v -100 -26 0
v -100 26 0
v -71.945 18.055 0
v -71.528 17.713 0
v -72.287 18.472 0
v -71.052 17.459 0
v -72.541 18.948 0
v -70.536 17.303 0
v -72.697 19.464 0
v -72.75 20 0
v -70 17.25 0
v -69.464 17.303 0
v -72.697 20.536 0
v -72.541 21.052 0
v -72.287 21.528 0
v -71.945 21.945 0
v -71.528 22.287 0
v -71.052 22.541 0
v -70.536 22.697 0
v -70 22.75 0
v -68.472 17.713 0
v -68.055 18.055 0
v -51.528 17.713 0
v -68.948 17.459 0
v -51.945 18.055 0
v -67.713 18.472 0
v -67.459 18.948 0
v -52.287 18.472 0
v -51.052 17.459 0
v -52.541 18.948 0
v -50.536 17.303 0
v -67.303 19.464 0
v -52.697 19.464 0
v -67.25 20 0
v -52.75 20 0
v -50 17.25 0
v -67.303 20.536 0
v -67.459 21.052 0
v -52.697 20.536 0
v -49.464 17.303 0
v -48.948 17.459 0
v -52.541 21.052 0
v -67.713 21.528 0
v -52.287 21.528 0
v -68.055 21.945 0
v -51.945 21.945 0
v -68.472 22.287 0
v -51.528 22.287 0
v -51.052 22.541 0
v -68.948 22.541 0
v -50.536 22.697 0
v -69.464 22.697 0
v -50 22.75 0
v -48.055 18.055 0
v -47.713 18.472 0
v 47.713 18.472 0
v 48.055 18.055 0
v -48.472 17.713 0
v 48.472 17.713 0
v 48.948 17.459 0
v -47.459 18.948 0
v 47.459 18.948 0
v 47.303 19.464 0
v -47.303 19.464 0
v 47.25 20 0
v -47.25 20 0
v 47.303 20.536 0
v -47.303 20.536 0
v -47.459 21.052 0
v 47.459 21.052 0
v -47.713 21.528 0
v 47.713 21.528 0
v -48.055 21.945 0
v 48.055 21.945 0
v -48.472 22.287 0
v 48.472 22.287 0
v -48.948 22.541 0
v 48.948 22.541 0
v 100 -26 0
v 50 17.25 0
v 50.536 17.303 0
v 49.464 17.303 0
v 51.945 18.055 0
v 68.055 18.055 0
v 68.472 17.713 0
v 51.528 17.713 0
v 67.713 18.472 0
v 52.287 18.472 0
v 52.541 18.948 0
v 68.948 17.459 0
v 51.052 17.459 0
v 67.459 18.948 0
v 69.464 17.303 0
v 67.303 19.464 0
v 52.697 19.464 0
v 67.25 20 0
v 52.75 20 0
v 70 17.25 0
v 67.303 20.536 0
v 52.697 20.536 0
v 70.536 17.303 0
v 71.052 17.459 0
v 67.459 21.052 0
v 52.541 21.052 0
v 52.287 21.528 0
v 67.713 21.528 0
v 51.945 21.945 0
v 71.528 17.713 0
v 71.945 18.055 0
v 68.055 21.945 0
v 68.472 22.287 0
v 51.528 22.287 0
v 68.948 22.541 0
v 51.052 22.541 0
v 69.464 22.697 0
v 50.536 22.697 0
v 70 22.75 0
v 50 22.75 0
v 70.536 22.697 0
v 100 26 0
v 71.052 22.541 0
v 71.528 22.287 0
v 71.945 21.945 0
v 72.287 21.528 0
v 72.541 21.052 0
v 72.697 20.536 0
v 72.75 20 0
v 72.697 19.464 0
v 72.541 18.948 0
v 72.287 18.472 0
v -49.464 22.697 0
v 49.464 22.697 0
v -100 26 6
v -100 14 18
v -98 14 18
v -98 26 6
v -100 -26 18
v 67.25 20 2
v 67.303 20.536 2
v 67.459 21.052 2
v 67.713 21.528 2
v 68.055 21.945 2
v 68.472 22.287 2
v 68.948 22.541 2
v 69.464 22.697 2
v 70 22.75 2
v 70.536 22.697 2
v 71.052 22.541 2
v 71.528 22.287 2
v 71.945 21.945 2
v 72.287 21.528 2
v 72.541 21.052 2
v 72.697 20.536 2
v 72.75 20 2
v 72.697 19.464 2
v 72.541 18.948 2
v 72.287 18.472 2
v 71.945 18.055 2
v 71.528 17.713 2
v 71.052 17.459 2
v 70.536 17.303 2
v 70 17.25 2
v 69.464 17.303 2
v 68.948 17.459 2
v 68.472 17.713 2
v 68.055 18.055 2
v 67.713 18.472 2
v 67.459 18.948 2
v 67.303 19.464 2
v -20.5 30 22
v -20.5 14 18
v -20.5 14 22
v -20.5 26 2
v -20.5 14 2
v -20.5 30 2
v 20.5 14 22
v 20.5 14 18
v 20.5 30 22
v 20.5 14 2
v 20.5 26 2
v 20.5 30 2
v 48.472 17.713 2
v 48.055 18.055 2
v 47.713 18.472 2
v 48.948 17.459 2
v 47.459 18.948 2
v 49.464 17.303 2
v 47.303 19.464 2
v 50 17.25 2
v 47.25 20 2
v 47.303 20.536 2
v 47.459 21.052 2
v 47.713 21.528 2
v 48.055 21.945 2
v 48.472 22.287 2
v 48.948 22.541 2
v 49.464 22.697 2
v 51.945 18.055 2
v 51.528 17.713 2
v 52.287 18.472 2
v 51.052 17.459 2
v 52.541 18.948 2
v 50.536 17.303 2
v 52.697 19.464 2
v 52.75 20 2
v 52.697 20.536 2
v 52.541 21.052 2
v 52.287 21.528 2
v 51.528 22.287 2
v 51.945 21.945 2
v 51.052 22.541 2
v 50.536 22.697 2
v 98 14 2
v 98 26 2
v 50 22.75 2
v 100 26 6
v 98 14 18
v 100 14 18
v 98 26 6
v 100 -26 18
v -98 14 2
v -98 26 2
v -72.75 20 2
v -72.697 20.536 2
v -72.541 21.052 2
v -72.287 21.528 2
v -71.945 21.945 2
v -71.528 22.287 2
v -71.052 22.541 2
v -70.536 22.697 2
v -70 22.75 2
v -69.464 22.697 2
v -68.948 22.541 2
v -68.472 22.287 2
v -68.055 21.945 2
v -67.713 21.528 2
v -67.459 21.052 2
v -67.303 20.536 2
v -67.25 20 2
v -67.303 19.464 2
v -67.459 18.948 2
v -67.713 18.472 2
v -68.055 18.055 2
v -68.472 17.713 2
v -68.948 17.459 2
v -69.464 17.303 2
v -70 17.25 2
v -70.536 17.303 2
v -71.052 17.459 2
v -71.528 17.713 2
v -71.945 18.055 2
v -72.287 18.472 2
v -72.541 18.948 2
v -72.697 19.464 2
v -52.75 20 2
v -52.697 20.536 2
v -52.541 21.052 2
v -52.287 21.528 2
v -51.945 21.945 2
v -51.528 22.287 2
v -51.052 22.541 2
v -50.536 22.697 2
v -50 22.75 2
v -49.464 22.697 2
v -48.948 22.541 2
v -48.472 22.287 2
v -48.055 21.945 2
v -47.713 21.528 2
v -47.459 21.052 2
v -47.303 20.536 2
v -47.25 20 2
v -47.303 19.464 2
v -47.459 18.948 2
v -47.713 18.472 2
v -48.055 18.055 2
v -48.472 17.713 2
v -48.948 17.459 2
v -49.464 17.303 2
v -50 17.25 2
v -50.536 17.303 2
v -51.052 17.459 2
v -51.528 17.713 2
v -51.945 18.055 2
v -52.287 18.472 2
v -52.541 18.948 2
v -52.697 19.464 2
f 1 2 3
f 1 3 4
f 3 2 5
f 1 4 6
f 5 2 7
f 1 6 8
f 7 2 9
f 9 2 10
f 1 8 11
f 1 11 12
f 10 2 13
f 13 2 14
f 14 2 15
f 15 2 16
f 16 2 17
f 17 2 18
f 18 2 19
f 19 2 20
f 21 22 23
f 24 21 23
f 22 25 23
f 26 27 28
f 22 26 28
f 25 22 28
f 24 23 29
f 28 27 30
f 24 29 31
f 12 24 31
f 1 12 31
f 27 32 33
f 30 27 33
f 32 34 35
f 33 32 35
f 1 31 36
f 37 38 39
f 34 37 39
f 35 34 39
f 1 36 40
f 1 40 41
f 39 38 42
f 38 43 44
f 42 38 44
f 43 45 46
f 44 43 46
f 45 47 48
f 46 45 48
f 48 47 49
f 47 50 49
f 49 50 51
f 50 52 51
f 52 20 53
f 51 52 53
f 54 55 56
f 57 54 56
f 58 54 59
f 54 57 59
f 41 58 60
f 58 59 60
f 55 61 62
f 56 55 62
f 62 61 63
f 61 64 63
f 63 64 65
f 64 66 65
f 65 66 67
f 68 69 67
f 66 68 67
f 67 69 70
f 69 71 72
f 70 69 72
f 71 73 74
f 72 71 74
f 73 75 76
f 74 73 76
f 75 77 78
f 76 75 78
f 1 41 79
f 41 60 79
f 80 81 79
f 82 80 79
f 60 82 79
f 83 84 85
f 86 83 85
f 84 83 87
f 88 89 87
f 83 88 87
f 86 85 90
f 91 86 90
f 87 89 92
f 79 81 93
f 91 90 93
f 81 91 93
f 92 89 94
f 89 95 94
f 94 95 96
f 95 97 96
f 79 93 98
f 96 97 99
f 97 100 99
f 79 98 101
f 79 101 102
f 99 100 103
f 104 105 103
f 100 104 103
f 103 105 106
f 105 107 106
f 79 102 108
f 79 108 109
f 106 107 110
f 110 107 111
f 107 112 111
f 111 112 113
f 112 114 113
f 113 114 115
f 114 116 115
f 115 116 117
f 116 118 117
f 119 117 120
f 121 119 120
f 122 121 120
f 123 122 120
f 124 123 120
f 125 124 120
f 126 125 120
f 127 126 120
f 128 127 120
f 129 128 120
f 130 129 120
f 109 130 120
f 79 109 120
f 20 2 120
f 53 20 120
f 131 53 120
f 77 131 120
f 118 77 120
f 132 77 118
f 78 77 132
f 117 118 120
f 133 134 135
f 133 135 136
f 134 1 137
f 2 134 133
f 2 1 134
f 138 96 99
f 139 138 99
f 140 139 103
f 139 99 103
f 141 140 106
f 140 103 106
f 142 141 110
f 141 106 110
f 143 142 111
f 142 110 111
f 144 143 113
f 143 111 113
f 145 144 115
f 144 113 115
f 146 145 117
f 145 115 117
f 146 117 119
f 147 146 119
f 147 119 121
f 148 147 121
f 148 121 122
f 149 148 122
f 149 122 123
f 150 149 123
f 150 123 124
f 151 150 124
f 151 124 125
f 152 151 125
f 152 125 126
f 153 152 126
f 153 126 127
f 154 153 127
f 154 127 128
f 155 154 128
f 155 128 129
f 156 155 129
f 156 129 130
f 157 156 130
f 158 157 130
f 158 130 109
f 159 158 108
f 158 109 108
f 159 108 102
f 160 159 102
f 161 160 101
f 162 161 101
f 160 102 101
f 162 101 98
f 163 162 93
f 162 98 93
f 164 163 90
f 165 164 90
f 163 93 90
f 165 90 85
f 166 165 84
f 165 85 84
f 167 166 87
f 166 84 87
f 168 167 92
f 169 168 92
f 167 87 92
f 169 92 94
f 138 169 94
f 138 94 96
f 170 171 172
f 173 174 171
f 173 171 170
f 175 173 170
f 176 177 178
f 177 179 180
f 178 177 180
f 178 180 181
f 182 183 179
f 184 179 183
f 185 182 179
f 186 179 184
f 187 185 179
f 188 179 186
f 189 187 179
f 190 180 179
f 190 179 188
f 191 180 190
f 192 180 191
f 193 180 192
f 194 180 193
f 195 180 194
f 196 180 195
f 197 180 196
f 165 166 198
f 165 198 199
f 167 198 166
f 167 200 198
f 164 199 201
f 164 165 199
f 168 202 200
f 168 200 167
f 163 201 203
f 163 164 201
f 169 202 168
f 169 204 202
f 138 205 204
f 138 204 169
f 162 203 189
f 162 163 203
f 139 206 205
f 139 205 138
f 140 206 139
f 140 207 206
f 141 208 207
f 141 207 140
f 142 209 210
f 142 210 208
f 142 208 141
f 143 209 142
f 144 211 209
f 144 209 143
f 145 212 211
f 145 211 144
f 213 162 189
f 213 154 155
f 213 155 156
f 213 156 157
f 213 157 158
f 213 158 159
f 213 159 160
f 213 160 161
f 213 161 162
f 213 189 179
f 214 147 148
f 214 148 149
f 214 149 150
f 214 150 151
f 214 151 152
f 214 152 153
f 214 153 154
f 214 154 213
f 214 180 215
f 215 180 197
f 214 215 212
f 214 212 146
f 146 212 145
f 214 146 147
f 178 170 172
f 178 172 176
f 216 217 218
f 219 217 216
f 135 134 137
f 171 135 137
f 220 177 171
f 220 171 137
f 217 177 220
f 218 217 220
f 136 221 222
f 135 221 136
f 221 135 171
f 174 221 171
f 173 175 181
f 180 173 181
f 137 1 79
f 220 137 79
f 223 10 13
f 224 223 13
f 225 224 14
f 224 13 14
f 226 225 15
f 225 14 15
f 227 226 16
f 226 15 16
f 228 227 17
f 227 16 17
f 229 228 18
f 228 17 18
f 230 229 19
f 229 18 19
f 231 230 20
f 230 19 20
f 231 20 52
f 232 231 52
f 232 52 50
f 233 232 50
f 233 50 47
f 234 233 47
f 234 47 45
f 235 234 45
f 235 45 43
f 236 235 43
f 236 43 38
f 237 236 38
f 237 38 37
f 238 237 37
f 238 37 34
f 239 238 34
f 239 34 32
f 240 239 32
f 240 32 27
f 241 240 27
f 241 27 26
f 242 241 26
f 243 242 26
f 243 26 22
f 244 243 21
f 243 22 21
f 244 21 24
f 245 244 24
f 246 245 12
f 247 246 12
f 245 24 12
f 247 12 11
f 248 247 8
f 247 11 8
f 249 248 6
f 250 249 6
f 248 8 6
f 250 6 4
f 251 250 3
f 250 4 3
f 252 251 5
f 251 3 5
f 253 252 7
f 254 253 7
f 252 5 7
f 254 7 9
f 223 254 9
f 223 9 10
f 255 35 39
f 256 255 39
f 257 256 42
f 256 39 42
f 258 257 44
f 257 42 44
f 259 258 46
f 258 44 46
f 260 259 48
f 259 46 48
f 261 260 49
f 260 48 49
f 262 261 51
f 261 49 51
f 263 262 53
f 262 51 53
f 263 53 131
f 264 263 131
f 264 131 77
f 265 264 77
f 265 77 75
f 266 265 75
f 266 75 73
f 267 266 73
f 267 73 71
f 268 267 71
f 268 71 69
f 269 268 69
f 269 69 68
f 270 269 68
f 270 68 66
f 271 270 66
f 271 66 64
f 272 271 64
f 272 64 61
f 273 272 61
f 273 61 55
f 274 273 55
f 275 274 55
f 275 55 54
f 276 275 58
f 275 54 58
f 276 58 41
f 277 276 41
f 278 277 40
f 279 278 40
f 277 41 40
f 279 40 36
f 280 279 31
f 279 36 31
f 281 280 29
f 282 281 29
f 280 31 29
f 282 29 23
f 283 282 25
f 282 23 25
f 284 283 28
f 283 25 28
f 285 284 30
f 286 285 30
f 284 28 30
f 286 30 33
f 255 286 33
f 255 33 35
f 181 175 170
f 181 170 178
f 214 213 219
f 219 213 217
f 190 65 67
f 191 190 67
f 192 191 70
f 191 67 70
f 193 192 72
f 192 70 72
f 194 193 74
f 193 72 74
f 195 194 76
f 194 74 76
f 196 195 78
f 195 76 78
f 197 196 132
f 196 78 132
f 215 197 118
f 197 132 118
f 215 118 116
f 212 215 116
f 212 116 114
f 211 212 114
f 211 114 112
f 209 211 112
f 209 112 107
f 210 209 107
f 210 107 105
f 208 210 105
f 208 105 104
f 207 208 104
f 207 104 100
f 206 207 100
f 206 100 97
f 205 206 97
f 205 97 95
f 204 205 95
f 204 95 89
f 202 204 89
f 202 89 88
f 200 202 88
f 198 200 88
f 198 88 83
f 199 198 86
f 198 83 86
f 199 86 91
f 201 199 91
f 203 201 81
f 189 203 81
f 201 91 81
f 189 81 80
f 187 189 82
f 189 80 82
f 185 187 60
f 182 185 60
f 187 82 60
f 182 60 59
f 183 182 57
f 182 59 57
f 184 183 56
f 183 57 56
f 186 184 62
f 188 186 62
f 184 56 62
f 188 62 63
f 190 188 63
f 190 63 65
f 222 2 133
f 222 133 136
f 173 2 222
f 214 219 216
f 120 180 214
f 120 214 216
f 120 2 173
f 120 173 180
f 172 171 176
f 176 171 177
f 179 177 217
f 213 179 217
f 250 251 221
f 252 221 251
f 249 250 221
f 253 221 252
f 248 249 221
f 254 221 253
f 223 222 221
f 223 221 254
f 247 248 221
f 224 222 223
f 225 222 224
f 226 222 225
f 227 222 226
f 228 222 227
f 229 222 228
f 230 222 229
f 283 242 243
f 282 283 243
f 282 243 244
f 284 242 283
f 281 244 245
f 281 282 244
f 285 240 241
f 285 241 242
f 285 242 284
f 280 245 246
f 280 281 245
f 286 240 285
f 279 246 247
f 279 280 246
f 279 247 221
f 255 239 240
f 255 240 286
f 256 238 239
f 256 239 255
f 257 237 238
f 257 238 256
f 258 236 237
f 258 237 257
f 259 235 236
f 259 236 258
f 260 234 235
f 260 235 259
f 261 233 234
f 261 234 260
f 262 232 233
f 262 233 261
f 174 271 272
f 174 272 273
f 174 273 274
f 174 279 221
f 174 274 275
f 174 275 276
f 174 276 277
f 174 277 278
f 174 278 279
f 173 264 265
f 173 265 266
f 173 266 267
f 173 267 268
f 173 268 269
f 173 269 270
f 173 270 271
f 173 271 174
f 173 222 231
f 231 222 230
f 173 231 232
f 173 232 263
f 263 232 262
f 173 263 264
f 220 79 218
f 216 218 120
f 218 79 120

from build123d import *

# Parameters (mm, degrees)
SKETCH_1_W          = 200
SKETCH_1_H          = 52
EXTRUDE_1_DEPTH     = 18
CUT_EXTRUDE_1_DEPTH = 203.484567313
SKETCH_3_W          = 196
SKETCH_3_H          = 12
CUT_EXTRUDE_2_DEPTH = 16
HOLE_WIZARD_M5_1_D  = 5.5
SKETCH_6_W          = 41
SKETCH_6_H          = 16
EXTRUDE_2_DEPTH     = 20


with BuildPart() as part:
    # 草图1 → 凸台-拉伸1 (new body)
    with BuildSketch(Plane.XY):
        Rectangle(SKETCH_1_W, SKETCH_1_H)
    extrude(amount=EXTRUDE_1_DEPTH)

    # 草图2 → 切除-拉伸1 (cut, through all)
    with BuildSketch(Plane.ZY.offset(100)):
        Polygon((18, 14), (6, 26), (18, 26), align=None)
    extrude(amount=-CUT_EXTRUDE_1_DEPTH, mode=Mode.SUBTRACT)

    # 草图3 → 切除-拉伸2 (cut)
    with BuildSketch(Plane.XY.offset(18)):
        with Locations((0, 20)):
            Rectangle(SKETCH_3_W, SKETCH_3_H)
    extrude(amount=-CUT_EXTRUDE_2_DEPTH, mode=Mode.SUBTRACT)

    # M5 间隙孔1 (through all)
    with Locations(Plane.XY.offset(2)):
        with Locations((-50, 20), (50, 20), (70, 20), (-70, 20)):
            Hole(HOLE_WIZARD_M5_1_D / 2)

    # 草图6 → 凸台-拉伸2 (add)
    with BuildSketch(Plane.XY.offset(2)):
        with Locations((0, 22)):
            Rectangle(SKETCH_6_W, SKETCH_6_H)
    extrude(amount=EXTRUDE_2_DEPTH)


solid = part.part
